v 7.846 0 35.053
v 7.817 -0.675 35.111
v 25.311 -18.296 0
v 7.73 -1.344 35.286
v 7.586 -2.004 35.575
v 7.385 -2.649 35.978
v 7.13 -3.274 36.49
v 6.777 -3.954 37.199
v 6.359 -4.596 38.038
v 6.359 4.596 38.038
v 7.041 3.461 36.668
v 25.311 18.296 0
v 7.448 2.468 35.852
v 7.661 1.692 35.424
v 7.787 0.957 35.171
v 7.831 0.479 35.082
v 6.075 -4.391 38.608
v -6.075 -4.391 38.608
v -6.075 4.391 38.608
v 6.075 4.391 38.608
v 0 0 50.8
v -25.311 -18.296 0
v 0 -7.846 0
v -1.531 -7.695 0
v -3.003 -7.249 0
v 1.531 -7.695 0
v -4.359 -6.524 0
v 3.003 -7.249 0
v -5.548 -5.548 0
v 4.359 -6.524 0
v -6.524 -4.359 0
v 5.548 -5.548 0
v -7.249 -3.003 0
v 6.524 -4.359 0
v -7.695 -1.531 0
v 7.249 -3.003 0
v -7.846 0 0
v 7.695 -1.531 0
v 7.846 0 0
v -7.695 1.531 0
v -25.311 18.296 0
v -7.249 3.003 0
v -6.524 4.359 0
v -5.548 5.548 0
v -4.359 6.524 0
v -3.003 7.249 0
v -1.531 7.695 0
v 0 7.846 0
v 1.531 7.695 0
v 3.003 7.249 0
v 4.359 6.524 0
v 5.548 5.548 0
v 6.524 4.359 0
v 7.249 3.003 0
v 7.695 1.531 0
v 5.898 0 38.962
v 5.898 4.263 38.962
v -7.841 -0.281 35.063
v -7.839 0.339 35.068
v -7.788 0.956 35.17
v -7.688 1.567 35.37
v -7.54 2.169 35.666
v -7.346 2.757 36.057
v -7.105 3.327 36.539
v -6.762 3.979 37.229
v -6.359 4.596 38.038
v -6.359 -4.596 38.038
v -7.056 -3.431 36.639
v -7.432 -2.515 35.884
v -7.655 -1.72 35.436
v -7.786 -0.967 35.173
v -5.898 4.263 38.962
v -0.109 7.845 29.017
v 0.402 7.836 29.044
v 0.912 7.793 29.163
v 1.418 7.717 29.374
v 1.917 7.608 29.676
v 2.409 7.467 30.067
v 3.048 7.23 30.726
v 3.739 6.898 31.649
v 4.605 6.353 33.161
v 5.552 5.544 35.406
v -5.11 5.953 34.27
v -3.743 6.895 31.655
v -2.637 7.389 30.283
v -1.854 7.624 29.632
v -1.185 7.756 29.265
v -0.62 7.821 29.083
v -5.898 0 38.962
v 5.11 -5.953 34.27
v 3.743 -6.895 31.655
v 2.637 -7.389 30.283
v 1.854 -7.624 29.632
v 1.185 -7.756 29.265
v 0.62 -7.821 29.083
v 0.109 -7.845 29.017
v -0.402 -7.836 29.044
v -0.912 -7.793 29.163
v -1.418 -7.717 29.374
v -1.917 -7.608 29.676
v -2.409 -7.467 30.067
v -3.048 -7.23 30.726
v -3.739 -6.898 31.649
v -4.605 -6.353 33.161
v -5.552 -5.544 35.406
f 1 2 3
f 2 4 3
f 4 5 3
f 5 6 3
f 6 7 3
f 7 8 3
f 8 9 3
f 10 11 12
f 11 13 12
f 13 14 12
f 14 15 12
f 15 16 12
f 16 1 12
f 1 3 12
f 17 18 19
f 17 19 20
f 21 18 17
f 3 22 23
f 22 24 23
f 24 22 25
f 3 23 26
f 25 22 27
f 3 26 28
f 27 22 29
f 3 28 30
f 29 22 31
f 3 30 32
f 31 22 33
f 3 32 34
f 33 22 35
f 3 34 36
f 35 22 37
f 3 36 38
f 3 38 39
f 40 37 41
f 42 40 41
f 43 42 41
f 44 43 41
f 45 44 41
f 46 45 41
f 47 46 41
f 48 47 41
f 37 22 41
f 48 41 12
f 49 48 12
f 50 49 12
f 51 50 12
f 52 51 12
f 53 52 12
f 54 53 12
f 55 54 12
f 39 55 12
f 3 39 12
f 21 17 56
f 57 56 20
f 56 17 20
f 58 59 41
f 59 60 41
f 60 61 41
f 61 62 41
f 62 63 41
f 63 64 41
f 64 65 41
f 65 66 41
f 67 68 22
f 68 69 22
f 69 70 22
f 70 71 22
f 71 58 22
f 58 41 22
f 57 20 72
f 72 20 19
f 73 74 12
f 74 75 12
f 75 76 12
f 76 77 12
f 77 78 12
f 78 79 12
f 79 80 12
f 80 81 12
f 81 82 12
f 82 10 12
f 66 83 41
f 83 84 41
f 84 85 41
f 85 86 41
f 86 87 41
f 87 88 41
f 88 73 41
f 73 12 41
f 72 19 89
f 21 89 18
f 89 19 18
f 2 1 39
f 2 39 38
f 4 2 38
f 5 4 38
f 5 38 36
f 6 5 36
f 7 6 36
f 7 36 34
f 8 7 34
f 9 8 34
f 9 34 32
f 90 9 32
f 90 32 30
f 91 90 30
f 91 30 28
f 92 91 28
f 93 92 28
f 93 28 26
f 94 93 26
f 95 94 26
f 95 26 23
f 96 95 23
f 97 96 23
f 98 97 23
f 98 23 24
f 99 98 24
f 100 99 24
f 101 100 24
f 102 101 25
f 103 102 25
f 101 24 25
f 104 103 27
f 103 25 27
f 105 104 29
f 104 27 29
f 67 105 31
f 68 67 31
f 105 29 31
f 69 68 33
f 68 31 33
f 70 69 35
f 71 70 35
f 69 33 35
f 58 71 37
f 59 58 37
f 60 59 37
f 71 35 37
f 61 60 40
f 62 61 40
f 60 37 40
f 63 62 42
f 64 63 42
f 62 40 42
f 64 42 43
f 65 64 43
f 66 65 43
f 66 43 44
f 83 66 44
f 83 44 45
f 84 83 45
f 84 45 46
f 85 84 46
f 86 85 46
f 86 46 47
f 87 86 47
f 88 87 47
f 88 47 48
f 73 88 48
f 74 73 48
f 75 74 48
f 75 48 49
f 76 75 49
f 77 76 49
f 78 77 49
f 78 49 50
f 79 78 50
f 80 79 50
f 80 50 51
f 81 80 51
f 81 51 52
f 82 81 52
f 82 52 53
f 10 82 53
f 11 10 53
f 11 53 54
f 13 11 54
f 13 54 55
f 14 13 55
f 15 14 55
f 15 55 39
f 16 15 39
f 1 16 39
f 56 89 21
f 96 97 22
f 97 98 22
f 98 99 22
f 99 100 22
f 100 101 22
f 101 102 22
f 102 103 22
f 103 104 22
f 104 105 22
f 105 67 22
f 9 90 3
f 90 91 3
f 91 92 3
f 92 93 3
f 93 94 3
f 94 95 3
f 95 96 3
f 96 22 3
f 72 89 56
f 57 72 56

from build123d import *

# Parameters (mm, degrees)
F0_W     = 50.62244
F0_H     = 36.592252
F4_W     = 49.864054
F4_H     = 33.369102
F5_DEPTH = 127
F6_R     = 7.845979
F7_DEPTH = 38.608


with BuildPart() as f3:
    # F0 (on Top) → F3 section 0
    with BuildSketch(Plane.XY, mode=Mode.PRIVATE) as f3_s0:
        Rectangle(F0_W, F0_H)
    loft([Vertex(0, 0, 50.8), f3_s0.sketch])

    # F4 (on Front) → F5 (cut)
    with BuildSketch(Plane.XZ):
        with Locations((0, 55.646766)):
            Rectangle(F4_W, F4_H)
    extrude(amount=-F5_DEPTH, mode=Mode.SUBTRACT)

    # F6 (on face) → F7 (cut)
    with BuildSketch(Plane(origin=(0, 0, 0), x_dir=(1, 0, 0), z_dir=(0, 0, -1))):
        Circle(F6_R)
    extrude(amount=-F7_DEPTH, mode=Mode.SUBTRACT)


solid = f3.part
